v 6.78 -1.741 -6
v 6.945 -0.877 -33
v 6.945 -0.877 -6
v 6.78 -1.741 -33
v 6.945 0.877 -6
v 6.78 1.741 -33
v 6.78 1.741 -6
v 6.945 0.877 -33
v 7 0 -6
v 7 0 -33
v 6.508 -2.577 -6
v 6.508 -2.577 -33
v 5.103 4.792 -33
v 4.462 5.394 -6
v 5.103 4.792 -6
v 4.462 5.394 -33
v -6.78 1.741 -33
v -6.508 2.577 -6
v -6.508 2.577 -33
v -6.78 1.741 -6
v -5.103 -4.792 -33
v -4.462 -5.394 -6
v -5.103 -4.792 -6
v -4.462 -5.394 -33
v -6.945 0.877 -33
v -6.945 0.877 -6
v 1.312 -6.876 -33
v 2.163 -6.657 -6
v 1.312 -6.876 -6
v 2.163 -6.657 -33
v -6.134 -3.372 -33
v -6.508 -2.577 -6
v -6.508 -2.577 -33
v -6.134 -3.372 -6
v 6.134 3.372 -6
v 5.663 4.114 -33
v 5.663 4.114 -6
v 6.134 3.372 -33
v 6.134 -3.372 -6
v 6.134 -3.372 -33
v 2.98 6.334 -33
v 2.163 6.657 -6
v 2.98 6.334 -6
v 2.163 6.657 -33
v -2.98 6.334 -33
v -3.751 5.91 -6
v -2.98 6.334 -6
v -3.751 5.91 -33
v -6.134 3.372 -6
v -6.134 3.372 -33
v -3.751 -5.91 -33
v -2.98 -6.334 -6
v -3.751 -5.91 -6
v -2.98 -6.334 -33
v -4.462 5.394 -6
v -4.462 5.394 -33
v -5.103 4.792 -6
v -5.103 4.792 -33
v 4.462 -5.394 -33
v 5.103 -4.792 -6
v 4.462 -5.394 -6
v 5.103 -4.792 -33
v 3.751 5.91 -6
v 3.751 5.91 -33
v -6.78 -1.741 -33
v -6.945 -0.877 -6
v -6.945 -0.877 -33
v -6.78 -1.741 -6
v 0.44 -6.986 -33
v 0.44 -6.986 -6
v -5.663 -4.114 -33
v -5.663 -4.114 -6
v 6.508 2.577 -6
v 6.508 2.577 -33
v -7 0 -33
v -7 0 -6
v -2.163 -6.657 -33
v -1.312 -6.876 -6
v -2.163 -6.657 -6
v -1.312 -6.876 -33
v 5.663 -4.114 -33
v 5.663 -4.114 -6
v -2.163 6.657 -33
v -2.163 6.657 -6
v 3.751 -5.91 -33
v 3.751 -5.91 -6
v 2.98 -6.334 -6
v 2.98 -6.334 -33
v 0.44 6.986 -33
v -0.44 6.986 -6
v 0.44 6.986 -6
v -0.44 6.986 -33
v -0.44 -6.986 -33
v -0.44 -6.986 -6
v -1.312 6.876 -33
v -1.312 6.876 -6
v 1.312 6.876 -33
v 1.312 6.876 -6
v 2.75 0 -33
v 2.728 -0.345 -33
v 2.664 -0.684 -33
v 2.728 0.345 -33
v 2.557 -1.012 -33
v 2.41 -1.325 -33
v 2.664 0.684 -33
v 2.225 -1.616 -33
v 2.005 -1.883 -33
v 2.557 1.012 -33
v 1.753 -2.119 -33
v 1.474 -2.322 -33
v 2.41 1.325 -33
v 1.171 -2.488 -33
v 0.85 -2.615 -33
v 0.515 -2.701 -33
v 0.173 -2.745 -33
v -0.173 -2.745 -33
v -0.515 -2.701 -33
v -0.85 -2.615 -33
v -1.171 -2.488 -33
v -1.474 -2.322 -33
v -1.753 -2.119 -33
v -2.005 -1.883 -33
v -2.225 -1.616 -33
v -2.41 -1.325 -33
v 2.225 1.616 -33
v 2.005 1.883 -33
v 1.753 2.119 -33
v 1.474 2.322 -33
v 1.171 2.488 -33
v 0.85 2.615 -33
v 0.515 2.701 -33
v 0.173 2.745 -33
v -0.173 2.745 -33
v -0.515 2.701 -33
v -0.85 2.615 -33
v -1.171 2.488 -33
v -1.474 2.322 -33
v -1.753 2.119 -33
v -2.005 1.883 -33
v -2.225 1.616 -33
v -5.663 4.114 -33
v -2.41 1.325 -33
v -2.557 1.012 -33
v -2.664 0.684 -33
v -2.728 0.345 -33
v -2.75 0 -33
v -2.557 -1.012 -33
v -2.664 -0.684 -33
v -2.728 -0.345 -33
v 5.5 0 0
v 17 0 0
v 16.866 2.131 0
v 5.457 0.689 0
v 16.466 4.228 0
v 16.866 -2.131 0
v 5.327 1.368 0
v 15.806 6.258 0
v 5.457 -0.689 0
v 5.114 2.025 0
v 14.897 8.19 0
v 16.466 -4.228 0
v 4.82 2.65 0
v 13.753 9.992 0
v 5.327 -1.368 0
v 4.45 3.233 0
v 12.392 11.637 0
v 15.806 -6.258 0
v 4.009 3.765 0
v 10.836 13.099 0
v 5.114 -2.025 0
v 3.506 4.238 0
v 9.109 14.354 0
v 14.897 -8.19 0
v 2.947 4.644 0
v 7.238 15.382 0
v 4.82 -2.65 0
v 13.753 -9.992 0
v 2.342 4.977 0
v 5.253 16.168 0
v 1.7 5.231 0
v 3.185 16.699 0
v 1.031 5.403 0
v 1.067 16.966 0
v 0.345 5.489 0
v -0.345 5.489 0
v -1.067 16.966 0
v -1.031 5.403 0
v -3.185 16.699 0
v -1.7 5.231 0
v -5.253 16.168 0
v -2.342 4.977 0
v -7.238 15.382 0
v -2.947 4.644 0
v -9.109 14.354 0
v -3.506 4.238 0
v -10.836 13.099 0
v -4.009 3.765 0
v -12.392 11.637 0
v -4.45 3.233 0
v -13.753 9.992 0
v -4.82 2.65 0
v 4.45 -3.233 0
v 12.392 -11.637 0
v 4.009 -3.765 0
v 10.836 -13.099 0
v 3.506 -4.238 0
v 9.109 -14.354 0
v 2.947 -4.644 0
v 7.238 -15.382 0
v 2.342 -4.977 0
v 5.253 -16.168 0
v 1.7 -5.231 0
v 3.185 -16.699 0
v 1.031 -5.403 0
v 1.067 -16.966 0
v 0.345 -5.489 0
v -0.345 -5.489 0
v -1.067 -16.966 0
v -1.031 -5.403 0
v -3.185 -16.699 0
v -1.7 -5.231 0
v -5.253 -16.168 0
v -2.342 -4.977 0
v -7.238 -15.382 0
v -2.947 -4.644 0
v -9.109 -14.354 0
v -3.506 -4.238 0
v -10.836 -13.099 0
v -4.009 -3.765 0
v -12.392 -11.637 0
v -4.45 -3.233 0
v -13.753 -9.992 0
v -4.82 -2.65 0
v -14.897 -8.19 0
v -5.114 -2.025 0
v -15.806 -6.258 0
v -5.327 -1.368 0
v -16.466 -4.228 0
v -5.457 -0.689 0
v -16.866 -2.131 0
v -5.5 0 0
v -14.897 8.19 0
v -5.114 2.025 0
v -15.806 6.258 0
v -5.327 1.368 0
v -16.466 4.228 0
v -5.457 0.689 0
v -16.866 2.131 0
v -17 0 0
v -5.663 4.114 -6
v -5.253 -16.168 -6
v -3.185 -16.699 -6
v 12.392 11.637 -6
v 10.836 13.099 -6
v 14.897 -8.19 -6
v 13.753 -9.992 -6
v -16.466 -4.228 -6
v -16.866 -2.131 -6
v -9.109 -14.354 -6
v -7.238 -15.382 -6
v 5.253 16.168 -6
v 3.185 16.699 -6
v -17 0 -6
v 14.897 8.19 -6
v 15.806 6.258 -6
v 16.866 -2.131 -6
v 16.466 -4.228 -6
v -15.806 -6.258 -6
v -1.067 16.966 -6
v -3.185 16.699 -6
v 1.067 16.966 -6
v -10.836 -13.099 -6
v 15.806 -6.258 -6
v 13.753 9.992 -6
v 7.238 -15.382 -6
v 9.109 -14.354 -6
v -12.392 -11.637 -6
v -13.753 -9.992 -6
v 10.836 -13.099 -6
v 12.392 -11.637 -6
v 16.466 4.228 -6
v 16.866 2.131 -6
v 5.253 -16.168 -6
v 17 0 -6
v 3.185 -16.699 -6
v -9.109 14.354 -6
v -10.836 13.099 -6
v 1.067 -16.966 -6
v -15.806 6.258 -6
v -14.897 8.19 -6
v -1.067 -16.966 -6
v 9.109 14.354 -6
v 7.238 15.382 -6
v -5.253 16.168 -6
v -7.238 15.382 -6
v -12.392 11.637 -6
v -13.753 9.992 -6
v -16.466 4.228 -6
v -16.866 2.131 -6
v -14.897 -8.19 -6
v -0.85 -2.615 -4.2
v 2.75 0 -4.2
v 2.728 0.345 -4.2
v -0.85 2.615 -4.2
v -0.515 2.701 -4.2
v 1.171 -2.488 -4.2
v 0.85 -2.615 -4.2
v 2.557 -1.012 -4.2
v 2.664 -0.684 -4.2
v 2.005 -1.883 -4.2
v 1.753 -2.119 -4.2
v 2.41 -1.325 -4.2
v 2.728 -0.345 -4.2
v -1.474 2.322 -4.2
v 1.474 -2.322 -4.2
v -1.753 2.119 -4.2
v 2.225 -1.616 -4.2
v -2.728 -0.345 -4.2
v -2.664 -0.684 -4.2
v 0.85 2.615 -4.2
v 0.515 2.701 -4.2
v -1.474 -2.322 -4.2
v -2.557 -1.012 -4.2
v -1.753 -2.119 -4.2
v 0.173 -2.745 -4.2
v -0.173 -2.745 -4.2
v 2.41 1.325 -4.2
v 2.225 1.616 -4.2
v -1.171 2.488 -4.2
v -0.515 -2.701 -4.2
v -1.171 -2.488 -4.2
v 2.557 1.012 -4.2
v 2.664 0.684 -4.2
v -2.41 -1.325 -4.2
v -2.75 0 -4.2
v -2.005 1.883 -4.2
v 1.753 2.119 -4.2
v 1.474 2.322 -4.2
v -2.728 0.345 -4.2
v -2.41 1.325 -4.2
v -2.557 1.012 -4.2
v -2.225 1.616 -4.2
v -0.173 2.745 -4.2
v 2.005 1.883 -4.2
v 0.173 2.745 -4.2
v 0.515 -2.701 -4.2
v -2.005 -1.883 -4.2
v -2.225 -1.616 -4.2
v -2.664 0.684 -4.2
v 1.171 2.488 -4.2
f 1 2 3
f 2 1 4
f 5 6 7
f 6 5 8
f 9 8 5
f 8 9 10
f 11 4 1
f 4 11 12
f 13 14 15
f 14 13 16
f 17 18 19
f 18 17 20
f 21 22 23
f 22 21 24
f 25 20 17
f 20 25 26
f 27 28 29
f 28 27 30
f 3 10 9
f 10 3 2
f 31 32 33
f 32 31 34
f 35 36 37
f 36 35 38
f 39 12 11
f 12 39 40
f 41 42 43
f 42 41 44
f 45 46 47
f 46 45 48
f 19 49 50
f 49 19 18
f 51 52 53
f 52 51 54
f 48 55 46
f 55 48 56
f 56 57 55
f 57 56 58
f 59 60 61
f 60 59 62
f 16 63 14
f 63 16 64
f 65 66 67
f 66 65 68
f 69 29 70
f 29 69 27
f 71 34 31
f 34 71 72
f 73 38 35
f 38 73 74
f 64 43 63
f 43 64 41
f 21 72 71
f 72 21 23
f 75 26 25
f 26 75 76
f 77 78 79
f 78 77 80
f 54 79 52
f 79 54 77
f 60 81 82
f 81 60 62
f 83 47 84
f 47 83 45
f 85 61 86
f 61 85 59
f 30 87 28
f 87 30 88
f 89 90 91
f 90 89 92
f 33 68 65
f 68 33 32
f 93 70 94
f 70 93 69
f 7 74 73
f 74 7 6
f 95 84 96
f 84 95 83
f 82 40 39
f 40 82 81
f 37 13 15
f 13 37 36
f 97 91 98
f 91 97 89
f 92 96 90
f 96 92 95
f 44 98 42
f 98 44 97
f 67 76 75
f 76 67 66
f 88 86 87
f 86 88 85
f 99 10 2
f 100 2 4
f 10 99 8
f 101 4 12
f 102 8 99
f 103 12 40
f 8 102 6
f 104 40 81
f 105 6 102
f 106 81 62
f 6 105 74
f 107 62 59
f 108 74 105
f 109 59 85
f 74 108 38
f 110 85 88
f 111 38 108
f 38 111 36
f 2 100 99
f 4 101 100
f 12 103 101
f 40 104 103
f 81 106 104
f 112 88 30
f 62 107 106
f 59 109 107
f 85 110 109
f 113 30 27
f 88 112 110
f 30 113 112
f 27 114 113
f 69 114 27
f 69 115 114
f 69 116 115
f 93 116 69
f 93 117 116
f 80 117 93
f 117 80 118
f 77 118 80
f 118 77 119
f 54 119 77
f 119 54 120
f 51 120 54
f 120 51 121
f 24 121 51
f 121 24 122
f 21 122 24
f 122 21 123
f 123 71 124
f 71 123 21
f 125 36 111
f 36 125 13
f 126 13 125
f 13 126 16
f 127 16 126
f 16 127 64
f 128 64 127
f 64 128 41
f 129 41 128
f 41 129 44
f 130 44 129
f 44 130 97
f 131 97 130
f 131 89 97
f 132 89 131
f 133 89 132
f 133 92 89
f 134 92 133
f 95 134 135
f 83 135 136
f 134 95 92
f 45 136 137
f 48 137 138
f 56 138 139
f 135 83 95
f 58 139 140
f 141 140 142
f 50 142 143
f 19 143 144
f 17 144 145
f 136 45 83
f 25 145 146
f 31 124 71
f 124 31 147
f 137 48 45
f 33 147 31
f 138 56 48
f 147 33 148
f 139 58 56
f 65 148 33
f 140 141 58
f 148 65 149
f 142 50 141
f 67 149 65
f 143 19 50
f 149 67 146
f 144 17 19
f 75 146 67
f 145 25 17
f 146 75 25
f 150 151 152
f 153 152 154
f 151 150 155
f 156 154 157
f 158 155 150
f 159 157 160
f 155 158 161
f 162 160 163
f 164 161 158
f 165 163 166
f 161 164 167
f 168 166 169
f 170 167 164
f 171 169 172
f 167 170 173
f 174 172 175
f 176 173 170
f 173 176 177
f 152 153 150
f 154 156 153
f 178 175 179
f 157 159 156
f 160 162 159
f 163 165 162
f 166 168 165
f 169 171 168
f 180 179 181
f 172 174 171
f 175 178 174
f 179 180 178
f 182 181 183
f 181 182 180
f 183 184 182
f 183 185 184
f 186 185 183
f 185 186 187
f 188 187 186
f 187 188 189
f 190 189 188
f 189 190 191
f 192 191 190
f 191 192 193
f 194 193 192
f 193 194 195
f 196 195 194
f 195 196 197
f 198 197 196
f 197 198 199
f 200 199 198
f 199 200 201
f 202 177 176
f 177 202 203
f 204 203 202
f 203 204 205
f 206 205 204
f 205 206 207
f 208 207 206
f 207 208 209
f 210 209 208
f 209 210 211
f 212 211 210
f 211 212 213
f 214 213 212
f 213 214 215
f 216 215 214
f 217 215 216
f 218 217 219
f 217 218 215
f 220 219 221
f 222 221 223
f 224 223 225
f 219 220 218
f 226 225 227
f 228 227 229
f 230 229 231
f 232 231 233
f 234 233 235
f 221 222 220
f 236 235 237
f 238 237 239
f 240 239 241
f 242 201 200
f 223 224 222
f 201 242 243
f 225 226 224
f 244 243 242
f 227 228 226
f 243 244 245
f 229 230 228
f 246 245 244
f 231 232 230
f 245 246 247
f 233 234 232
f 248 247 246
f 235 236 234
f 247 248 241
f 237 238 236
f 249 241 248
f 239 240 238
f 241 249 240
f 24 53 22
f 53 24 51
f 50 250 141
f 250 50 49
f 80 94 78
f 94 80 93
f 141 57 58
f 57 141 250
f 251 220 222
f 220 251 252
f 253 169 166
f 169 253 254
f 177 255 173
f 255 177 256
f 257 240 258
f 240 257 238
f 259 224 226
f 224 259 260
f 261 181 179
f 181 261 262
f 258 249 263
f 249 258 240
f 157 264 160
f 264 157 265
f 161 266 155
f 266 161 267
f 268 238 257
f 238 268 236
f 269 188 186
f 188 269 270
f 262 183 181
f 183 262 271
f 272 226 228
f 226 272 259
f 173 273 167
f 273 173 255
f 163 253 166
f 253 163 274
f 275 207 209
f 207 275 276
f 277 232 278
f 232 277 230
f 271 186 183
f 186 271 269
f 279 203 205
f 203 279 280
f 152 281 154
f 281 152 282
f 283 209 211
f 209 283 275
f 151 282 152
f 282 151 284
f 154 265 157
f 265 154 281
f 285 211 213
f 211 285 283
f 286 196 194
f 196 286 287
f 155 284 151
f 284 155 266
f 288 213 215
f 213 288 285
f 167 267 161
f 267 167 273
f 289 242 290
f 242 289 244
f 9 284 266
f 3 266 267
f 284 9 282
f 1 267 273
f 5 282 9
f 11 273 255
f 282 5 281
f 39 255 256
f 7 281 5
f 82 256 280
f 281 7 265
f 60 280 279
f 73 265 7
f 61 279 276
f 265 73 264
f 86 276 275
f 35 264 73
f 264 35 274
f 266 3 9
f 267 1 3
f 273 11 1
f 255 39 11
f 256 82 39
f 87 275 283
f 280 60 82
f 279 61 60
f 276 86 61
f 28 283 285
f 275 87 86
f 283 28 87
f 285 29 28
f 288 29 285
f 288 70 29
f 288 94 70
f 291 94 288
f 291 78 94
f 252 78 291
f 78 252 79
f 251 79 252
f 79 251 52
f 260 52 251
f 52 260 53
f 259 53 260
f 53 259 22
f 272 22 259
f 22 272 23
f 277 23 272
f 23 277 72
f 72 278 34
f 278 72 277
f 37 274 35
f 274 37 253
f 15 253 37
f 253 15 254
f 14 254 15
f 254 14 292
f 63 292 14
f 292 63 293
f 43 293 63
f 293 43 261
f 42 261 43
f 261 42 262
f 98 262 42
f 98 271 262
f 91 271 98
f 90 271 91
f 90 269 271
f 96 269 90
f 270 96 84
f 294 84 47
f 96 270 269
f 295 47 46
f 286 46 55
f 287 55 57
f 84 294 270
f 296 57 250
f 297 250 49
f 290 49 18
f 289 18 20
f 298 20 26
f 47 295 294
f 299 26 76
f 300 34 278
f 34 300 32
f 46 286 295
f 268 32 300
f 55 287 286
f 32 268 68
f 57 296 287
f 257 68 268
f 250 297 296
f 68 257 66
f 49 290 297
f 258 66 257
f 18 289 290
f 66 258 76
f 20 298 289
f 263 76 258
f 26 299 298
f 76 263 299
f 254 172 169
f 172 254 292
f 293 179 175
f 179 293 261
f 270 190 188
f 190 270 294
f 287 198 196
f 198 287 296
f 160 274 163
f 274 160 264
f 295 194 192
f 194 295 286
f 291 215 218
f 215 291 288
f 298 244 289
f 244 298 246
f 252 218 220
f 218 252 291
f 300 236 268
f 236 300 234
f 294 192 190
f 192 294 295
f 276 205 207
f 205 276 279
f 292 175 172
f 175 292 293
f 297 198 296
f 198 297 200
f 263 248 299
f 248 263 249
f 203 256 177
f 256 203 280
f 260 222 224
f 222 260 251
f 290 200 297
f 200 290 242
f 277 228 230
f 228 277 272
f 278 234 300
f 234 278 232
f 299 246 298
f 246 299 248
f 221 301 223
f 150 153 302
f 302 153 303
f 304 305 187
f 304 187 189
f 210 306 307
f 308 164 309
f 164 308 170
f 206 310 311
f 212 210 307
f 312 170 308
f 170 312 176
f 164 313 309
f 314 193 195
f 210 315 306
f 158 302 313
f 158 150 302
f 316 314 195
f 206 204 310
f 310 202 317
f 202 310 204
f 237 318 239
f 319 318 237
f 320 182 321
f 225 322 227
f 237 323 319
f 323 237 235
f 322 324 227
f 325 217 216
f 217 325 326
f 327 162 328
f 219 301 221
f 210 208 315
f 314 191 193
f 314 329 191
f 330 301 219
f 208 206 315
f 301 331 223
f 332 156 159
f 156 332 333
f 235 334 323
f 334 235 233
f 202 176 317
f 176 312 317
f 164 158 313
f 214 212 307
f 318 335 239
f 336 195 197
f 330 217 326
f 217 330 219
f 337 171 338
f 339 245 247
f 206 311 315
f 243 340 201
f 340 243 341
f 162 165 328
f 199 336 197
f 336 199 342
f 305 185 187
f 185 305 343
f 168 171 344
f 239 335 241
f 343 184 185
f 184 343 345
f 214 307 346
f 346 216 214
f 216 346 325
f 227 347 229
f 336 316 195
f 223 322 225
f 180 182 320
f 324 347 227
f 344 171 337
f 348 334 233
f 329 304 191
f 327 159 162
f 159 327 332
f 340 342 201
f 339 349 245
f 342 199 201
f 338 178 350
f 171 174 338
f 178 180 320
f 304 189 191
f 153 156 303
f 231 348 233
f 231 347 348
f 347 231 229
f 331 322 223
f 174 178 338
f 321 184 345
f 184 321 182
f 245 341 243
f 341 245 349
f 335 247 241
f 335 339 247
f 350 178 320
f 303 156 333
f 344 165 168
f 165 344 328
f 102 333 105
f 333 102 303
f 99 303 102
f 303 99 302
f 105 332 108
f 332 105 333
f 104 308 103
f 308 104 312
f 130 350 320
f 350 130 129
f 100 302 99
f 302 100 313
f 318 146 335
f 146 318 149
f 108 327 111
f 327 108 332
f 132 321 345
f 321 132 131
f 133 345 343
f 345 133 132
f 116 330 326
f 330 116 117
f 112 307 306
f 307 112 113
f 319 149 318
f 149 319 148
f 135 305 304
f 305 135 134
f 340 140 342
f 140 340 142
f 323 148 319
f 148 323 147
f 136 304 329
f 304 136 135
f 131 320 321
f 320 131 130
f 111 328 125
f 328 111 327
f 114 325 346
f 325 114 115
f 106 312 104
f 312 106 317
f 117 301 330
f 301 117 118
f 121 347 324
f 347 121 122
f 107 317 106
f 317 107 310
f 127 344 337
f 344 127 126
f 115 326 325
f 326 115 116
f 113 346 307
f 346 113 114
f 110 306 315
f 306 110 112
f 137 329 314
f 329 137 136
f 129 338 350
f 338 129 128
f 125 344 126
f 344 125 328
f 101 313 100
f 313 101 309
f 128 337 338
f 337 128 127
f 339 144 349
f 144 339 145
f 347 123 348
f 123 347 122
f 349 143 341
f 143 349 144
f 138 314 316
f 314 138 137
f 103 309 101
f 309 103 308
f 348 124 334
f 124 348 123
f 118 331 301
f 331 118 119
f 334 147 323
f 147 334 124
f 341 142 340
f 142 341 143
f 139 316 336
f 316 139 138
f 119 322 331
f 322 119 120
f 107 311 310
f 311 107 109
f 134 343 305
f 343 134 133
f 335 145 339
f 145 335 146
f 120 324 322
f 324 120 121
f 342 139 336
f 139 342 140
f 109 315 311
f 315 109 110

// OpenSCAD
$fn = 50;


difference() {
	union() {
		translate(v = [0, 0, -33.0000000000]) {
			cylinder(h = 33, r = 7.0000000000);
		}
		translate(v = [0, 0, -6.0000000000]) {
			cylinder(h = 6, r = 17.0000000000);
		}
	}
	union() {
		translate(v = [0, 0, 0]) {
			rotate(a = [0, 0, 0]) {
				difference() {
					union() {
						#translate(v = [0, 0, -33.0000000000]) {
							cylinder(h = 33, r = 2.2500000000);
						}
						#translate(v = [0, 0, -4.2000000000]) {
							cylinder(h = 4.2000000000, r = 7.0000000000, r1 = 2.7500000000, r2 = 5.5000000000);
						}
						#translate(v = [0, 0, -33.0000000000]) {
							cylinder(h = 33, r = 2.7500000000);
						}
						#translate(v = [0, 0, -33.0000000000]) {
							cylinder(h = 33, r = 2.2500000000);
						}
					}
					union();
				}
			}
		}
	}
}
